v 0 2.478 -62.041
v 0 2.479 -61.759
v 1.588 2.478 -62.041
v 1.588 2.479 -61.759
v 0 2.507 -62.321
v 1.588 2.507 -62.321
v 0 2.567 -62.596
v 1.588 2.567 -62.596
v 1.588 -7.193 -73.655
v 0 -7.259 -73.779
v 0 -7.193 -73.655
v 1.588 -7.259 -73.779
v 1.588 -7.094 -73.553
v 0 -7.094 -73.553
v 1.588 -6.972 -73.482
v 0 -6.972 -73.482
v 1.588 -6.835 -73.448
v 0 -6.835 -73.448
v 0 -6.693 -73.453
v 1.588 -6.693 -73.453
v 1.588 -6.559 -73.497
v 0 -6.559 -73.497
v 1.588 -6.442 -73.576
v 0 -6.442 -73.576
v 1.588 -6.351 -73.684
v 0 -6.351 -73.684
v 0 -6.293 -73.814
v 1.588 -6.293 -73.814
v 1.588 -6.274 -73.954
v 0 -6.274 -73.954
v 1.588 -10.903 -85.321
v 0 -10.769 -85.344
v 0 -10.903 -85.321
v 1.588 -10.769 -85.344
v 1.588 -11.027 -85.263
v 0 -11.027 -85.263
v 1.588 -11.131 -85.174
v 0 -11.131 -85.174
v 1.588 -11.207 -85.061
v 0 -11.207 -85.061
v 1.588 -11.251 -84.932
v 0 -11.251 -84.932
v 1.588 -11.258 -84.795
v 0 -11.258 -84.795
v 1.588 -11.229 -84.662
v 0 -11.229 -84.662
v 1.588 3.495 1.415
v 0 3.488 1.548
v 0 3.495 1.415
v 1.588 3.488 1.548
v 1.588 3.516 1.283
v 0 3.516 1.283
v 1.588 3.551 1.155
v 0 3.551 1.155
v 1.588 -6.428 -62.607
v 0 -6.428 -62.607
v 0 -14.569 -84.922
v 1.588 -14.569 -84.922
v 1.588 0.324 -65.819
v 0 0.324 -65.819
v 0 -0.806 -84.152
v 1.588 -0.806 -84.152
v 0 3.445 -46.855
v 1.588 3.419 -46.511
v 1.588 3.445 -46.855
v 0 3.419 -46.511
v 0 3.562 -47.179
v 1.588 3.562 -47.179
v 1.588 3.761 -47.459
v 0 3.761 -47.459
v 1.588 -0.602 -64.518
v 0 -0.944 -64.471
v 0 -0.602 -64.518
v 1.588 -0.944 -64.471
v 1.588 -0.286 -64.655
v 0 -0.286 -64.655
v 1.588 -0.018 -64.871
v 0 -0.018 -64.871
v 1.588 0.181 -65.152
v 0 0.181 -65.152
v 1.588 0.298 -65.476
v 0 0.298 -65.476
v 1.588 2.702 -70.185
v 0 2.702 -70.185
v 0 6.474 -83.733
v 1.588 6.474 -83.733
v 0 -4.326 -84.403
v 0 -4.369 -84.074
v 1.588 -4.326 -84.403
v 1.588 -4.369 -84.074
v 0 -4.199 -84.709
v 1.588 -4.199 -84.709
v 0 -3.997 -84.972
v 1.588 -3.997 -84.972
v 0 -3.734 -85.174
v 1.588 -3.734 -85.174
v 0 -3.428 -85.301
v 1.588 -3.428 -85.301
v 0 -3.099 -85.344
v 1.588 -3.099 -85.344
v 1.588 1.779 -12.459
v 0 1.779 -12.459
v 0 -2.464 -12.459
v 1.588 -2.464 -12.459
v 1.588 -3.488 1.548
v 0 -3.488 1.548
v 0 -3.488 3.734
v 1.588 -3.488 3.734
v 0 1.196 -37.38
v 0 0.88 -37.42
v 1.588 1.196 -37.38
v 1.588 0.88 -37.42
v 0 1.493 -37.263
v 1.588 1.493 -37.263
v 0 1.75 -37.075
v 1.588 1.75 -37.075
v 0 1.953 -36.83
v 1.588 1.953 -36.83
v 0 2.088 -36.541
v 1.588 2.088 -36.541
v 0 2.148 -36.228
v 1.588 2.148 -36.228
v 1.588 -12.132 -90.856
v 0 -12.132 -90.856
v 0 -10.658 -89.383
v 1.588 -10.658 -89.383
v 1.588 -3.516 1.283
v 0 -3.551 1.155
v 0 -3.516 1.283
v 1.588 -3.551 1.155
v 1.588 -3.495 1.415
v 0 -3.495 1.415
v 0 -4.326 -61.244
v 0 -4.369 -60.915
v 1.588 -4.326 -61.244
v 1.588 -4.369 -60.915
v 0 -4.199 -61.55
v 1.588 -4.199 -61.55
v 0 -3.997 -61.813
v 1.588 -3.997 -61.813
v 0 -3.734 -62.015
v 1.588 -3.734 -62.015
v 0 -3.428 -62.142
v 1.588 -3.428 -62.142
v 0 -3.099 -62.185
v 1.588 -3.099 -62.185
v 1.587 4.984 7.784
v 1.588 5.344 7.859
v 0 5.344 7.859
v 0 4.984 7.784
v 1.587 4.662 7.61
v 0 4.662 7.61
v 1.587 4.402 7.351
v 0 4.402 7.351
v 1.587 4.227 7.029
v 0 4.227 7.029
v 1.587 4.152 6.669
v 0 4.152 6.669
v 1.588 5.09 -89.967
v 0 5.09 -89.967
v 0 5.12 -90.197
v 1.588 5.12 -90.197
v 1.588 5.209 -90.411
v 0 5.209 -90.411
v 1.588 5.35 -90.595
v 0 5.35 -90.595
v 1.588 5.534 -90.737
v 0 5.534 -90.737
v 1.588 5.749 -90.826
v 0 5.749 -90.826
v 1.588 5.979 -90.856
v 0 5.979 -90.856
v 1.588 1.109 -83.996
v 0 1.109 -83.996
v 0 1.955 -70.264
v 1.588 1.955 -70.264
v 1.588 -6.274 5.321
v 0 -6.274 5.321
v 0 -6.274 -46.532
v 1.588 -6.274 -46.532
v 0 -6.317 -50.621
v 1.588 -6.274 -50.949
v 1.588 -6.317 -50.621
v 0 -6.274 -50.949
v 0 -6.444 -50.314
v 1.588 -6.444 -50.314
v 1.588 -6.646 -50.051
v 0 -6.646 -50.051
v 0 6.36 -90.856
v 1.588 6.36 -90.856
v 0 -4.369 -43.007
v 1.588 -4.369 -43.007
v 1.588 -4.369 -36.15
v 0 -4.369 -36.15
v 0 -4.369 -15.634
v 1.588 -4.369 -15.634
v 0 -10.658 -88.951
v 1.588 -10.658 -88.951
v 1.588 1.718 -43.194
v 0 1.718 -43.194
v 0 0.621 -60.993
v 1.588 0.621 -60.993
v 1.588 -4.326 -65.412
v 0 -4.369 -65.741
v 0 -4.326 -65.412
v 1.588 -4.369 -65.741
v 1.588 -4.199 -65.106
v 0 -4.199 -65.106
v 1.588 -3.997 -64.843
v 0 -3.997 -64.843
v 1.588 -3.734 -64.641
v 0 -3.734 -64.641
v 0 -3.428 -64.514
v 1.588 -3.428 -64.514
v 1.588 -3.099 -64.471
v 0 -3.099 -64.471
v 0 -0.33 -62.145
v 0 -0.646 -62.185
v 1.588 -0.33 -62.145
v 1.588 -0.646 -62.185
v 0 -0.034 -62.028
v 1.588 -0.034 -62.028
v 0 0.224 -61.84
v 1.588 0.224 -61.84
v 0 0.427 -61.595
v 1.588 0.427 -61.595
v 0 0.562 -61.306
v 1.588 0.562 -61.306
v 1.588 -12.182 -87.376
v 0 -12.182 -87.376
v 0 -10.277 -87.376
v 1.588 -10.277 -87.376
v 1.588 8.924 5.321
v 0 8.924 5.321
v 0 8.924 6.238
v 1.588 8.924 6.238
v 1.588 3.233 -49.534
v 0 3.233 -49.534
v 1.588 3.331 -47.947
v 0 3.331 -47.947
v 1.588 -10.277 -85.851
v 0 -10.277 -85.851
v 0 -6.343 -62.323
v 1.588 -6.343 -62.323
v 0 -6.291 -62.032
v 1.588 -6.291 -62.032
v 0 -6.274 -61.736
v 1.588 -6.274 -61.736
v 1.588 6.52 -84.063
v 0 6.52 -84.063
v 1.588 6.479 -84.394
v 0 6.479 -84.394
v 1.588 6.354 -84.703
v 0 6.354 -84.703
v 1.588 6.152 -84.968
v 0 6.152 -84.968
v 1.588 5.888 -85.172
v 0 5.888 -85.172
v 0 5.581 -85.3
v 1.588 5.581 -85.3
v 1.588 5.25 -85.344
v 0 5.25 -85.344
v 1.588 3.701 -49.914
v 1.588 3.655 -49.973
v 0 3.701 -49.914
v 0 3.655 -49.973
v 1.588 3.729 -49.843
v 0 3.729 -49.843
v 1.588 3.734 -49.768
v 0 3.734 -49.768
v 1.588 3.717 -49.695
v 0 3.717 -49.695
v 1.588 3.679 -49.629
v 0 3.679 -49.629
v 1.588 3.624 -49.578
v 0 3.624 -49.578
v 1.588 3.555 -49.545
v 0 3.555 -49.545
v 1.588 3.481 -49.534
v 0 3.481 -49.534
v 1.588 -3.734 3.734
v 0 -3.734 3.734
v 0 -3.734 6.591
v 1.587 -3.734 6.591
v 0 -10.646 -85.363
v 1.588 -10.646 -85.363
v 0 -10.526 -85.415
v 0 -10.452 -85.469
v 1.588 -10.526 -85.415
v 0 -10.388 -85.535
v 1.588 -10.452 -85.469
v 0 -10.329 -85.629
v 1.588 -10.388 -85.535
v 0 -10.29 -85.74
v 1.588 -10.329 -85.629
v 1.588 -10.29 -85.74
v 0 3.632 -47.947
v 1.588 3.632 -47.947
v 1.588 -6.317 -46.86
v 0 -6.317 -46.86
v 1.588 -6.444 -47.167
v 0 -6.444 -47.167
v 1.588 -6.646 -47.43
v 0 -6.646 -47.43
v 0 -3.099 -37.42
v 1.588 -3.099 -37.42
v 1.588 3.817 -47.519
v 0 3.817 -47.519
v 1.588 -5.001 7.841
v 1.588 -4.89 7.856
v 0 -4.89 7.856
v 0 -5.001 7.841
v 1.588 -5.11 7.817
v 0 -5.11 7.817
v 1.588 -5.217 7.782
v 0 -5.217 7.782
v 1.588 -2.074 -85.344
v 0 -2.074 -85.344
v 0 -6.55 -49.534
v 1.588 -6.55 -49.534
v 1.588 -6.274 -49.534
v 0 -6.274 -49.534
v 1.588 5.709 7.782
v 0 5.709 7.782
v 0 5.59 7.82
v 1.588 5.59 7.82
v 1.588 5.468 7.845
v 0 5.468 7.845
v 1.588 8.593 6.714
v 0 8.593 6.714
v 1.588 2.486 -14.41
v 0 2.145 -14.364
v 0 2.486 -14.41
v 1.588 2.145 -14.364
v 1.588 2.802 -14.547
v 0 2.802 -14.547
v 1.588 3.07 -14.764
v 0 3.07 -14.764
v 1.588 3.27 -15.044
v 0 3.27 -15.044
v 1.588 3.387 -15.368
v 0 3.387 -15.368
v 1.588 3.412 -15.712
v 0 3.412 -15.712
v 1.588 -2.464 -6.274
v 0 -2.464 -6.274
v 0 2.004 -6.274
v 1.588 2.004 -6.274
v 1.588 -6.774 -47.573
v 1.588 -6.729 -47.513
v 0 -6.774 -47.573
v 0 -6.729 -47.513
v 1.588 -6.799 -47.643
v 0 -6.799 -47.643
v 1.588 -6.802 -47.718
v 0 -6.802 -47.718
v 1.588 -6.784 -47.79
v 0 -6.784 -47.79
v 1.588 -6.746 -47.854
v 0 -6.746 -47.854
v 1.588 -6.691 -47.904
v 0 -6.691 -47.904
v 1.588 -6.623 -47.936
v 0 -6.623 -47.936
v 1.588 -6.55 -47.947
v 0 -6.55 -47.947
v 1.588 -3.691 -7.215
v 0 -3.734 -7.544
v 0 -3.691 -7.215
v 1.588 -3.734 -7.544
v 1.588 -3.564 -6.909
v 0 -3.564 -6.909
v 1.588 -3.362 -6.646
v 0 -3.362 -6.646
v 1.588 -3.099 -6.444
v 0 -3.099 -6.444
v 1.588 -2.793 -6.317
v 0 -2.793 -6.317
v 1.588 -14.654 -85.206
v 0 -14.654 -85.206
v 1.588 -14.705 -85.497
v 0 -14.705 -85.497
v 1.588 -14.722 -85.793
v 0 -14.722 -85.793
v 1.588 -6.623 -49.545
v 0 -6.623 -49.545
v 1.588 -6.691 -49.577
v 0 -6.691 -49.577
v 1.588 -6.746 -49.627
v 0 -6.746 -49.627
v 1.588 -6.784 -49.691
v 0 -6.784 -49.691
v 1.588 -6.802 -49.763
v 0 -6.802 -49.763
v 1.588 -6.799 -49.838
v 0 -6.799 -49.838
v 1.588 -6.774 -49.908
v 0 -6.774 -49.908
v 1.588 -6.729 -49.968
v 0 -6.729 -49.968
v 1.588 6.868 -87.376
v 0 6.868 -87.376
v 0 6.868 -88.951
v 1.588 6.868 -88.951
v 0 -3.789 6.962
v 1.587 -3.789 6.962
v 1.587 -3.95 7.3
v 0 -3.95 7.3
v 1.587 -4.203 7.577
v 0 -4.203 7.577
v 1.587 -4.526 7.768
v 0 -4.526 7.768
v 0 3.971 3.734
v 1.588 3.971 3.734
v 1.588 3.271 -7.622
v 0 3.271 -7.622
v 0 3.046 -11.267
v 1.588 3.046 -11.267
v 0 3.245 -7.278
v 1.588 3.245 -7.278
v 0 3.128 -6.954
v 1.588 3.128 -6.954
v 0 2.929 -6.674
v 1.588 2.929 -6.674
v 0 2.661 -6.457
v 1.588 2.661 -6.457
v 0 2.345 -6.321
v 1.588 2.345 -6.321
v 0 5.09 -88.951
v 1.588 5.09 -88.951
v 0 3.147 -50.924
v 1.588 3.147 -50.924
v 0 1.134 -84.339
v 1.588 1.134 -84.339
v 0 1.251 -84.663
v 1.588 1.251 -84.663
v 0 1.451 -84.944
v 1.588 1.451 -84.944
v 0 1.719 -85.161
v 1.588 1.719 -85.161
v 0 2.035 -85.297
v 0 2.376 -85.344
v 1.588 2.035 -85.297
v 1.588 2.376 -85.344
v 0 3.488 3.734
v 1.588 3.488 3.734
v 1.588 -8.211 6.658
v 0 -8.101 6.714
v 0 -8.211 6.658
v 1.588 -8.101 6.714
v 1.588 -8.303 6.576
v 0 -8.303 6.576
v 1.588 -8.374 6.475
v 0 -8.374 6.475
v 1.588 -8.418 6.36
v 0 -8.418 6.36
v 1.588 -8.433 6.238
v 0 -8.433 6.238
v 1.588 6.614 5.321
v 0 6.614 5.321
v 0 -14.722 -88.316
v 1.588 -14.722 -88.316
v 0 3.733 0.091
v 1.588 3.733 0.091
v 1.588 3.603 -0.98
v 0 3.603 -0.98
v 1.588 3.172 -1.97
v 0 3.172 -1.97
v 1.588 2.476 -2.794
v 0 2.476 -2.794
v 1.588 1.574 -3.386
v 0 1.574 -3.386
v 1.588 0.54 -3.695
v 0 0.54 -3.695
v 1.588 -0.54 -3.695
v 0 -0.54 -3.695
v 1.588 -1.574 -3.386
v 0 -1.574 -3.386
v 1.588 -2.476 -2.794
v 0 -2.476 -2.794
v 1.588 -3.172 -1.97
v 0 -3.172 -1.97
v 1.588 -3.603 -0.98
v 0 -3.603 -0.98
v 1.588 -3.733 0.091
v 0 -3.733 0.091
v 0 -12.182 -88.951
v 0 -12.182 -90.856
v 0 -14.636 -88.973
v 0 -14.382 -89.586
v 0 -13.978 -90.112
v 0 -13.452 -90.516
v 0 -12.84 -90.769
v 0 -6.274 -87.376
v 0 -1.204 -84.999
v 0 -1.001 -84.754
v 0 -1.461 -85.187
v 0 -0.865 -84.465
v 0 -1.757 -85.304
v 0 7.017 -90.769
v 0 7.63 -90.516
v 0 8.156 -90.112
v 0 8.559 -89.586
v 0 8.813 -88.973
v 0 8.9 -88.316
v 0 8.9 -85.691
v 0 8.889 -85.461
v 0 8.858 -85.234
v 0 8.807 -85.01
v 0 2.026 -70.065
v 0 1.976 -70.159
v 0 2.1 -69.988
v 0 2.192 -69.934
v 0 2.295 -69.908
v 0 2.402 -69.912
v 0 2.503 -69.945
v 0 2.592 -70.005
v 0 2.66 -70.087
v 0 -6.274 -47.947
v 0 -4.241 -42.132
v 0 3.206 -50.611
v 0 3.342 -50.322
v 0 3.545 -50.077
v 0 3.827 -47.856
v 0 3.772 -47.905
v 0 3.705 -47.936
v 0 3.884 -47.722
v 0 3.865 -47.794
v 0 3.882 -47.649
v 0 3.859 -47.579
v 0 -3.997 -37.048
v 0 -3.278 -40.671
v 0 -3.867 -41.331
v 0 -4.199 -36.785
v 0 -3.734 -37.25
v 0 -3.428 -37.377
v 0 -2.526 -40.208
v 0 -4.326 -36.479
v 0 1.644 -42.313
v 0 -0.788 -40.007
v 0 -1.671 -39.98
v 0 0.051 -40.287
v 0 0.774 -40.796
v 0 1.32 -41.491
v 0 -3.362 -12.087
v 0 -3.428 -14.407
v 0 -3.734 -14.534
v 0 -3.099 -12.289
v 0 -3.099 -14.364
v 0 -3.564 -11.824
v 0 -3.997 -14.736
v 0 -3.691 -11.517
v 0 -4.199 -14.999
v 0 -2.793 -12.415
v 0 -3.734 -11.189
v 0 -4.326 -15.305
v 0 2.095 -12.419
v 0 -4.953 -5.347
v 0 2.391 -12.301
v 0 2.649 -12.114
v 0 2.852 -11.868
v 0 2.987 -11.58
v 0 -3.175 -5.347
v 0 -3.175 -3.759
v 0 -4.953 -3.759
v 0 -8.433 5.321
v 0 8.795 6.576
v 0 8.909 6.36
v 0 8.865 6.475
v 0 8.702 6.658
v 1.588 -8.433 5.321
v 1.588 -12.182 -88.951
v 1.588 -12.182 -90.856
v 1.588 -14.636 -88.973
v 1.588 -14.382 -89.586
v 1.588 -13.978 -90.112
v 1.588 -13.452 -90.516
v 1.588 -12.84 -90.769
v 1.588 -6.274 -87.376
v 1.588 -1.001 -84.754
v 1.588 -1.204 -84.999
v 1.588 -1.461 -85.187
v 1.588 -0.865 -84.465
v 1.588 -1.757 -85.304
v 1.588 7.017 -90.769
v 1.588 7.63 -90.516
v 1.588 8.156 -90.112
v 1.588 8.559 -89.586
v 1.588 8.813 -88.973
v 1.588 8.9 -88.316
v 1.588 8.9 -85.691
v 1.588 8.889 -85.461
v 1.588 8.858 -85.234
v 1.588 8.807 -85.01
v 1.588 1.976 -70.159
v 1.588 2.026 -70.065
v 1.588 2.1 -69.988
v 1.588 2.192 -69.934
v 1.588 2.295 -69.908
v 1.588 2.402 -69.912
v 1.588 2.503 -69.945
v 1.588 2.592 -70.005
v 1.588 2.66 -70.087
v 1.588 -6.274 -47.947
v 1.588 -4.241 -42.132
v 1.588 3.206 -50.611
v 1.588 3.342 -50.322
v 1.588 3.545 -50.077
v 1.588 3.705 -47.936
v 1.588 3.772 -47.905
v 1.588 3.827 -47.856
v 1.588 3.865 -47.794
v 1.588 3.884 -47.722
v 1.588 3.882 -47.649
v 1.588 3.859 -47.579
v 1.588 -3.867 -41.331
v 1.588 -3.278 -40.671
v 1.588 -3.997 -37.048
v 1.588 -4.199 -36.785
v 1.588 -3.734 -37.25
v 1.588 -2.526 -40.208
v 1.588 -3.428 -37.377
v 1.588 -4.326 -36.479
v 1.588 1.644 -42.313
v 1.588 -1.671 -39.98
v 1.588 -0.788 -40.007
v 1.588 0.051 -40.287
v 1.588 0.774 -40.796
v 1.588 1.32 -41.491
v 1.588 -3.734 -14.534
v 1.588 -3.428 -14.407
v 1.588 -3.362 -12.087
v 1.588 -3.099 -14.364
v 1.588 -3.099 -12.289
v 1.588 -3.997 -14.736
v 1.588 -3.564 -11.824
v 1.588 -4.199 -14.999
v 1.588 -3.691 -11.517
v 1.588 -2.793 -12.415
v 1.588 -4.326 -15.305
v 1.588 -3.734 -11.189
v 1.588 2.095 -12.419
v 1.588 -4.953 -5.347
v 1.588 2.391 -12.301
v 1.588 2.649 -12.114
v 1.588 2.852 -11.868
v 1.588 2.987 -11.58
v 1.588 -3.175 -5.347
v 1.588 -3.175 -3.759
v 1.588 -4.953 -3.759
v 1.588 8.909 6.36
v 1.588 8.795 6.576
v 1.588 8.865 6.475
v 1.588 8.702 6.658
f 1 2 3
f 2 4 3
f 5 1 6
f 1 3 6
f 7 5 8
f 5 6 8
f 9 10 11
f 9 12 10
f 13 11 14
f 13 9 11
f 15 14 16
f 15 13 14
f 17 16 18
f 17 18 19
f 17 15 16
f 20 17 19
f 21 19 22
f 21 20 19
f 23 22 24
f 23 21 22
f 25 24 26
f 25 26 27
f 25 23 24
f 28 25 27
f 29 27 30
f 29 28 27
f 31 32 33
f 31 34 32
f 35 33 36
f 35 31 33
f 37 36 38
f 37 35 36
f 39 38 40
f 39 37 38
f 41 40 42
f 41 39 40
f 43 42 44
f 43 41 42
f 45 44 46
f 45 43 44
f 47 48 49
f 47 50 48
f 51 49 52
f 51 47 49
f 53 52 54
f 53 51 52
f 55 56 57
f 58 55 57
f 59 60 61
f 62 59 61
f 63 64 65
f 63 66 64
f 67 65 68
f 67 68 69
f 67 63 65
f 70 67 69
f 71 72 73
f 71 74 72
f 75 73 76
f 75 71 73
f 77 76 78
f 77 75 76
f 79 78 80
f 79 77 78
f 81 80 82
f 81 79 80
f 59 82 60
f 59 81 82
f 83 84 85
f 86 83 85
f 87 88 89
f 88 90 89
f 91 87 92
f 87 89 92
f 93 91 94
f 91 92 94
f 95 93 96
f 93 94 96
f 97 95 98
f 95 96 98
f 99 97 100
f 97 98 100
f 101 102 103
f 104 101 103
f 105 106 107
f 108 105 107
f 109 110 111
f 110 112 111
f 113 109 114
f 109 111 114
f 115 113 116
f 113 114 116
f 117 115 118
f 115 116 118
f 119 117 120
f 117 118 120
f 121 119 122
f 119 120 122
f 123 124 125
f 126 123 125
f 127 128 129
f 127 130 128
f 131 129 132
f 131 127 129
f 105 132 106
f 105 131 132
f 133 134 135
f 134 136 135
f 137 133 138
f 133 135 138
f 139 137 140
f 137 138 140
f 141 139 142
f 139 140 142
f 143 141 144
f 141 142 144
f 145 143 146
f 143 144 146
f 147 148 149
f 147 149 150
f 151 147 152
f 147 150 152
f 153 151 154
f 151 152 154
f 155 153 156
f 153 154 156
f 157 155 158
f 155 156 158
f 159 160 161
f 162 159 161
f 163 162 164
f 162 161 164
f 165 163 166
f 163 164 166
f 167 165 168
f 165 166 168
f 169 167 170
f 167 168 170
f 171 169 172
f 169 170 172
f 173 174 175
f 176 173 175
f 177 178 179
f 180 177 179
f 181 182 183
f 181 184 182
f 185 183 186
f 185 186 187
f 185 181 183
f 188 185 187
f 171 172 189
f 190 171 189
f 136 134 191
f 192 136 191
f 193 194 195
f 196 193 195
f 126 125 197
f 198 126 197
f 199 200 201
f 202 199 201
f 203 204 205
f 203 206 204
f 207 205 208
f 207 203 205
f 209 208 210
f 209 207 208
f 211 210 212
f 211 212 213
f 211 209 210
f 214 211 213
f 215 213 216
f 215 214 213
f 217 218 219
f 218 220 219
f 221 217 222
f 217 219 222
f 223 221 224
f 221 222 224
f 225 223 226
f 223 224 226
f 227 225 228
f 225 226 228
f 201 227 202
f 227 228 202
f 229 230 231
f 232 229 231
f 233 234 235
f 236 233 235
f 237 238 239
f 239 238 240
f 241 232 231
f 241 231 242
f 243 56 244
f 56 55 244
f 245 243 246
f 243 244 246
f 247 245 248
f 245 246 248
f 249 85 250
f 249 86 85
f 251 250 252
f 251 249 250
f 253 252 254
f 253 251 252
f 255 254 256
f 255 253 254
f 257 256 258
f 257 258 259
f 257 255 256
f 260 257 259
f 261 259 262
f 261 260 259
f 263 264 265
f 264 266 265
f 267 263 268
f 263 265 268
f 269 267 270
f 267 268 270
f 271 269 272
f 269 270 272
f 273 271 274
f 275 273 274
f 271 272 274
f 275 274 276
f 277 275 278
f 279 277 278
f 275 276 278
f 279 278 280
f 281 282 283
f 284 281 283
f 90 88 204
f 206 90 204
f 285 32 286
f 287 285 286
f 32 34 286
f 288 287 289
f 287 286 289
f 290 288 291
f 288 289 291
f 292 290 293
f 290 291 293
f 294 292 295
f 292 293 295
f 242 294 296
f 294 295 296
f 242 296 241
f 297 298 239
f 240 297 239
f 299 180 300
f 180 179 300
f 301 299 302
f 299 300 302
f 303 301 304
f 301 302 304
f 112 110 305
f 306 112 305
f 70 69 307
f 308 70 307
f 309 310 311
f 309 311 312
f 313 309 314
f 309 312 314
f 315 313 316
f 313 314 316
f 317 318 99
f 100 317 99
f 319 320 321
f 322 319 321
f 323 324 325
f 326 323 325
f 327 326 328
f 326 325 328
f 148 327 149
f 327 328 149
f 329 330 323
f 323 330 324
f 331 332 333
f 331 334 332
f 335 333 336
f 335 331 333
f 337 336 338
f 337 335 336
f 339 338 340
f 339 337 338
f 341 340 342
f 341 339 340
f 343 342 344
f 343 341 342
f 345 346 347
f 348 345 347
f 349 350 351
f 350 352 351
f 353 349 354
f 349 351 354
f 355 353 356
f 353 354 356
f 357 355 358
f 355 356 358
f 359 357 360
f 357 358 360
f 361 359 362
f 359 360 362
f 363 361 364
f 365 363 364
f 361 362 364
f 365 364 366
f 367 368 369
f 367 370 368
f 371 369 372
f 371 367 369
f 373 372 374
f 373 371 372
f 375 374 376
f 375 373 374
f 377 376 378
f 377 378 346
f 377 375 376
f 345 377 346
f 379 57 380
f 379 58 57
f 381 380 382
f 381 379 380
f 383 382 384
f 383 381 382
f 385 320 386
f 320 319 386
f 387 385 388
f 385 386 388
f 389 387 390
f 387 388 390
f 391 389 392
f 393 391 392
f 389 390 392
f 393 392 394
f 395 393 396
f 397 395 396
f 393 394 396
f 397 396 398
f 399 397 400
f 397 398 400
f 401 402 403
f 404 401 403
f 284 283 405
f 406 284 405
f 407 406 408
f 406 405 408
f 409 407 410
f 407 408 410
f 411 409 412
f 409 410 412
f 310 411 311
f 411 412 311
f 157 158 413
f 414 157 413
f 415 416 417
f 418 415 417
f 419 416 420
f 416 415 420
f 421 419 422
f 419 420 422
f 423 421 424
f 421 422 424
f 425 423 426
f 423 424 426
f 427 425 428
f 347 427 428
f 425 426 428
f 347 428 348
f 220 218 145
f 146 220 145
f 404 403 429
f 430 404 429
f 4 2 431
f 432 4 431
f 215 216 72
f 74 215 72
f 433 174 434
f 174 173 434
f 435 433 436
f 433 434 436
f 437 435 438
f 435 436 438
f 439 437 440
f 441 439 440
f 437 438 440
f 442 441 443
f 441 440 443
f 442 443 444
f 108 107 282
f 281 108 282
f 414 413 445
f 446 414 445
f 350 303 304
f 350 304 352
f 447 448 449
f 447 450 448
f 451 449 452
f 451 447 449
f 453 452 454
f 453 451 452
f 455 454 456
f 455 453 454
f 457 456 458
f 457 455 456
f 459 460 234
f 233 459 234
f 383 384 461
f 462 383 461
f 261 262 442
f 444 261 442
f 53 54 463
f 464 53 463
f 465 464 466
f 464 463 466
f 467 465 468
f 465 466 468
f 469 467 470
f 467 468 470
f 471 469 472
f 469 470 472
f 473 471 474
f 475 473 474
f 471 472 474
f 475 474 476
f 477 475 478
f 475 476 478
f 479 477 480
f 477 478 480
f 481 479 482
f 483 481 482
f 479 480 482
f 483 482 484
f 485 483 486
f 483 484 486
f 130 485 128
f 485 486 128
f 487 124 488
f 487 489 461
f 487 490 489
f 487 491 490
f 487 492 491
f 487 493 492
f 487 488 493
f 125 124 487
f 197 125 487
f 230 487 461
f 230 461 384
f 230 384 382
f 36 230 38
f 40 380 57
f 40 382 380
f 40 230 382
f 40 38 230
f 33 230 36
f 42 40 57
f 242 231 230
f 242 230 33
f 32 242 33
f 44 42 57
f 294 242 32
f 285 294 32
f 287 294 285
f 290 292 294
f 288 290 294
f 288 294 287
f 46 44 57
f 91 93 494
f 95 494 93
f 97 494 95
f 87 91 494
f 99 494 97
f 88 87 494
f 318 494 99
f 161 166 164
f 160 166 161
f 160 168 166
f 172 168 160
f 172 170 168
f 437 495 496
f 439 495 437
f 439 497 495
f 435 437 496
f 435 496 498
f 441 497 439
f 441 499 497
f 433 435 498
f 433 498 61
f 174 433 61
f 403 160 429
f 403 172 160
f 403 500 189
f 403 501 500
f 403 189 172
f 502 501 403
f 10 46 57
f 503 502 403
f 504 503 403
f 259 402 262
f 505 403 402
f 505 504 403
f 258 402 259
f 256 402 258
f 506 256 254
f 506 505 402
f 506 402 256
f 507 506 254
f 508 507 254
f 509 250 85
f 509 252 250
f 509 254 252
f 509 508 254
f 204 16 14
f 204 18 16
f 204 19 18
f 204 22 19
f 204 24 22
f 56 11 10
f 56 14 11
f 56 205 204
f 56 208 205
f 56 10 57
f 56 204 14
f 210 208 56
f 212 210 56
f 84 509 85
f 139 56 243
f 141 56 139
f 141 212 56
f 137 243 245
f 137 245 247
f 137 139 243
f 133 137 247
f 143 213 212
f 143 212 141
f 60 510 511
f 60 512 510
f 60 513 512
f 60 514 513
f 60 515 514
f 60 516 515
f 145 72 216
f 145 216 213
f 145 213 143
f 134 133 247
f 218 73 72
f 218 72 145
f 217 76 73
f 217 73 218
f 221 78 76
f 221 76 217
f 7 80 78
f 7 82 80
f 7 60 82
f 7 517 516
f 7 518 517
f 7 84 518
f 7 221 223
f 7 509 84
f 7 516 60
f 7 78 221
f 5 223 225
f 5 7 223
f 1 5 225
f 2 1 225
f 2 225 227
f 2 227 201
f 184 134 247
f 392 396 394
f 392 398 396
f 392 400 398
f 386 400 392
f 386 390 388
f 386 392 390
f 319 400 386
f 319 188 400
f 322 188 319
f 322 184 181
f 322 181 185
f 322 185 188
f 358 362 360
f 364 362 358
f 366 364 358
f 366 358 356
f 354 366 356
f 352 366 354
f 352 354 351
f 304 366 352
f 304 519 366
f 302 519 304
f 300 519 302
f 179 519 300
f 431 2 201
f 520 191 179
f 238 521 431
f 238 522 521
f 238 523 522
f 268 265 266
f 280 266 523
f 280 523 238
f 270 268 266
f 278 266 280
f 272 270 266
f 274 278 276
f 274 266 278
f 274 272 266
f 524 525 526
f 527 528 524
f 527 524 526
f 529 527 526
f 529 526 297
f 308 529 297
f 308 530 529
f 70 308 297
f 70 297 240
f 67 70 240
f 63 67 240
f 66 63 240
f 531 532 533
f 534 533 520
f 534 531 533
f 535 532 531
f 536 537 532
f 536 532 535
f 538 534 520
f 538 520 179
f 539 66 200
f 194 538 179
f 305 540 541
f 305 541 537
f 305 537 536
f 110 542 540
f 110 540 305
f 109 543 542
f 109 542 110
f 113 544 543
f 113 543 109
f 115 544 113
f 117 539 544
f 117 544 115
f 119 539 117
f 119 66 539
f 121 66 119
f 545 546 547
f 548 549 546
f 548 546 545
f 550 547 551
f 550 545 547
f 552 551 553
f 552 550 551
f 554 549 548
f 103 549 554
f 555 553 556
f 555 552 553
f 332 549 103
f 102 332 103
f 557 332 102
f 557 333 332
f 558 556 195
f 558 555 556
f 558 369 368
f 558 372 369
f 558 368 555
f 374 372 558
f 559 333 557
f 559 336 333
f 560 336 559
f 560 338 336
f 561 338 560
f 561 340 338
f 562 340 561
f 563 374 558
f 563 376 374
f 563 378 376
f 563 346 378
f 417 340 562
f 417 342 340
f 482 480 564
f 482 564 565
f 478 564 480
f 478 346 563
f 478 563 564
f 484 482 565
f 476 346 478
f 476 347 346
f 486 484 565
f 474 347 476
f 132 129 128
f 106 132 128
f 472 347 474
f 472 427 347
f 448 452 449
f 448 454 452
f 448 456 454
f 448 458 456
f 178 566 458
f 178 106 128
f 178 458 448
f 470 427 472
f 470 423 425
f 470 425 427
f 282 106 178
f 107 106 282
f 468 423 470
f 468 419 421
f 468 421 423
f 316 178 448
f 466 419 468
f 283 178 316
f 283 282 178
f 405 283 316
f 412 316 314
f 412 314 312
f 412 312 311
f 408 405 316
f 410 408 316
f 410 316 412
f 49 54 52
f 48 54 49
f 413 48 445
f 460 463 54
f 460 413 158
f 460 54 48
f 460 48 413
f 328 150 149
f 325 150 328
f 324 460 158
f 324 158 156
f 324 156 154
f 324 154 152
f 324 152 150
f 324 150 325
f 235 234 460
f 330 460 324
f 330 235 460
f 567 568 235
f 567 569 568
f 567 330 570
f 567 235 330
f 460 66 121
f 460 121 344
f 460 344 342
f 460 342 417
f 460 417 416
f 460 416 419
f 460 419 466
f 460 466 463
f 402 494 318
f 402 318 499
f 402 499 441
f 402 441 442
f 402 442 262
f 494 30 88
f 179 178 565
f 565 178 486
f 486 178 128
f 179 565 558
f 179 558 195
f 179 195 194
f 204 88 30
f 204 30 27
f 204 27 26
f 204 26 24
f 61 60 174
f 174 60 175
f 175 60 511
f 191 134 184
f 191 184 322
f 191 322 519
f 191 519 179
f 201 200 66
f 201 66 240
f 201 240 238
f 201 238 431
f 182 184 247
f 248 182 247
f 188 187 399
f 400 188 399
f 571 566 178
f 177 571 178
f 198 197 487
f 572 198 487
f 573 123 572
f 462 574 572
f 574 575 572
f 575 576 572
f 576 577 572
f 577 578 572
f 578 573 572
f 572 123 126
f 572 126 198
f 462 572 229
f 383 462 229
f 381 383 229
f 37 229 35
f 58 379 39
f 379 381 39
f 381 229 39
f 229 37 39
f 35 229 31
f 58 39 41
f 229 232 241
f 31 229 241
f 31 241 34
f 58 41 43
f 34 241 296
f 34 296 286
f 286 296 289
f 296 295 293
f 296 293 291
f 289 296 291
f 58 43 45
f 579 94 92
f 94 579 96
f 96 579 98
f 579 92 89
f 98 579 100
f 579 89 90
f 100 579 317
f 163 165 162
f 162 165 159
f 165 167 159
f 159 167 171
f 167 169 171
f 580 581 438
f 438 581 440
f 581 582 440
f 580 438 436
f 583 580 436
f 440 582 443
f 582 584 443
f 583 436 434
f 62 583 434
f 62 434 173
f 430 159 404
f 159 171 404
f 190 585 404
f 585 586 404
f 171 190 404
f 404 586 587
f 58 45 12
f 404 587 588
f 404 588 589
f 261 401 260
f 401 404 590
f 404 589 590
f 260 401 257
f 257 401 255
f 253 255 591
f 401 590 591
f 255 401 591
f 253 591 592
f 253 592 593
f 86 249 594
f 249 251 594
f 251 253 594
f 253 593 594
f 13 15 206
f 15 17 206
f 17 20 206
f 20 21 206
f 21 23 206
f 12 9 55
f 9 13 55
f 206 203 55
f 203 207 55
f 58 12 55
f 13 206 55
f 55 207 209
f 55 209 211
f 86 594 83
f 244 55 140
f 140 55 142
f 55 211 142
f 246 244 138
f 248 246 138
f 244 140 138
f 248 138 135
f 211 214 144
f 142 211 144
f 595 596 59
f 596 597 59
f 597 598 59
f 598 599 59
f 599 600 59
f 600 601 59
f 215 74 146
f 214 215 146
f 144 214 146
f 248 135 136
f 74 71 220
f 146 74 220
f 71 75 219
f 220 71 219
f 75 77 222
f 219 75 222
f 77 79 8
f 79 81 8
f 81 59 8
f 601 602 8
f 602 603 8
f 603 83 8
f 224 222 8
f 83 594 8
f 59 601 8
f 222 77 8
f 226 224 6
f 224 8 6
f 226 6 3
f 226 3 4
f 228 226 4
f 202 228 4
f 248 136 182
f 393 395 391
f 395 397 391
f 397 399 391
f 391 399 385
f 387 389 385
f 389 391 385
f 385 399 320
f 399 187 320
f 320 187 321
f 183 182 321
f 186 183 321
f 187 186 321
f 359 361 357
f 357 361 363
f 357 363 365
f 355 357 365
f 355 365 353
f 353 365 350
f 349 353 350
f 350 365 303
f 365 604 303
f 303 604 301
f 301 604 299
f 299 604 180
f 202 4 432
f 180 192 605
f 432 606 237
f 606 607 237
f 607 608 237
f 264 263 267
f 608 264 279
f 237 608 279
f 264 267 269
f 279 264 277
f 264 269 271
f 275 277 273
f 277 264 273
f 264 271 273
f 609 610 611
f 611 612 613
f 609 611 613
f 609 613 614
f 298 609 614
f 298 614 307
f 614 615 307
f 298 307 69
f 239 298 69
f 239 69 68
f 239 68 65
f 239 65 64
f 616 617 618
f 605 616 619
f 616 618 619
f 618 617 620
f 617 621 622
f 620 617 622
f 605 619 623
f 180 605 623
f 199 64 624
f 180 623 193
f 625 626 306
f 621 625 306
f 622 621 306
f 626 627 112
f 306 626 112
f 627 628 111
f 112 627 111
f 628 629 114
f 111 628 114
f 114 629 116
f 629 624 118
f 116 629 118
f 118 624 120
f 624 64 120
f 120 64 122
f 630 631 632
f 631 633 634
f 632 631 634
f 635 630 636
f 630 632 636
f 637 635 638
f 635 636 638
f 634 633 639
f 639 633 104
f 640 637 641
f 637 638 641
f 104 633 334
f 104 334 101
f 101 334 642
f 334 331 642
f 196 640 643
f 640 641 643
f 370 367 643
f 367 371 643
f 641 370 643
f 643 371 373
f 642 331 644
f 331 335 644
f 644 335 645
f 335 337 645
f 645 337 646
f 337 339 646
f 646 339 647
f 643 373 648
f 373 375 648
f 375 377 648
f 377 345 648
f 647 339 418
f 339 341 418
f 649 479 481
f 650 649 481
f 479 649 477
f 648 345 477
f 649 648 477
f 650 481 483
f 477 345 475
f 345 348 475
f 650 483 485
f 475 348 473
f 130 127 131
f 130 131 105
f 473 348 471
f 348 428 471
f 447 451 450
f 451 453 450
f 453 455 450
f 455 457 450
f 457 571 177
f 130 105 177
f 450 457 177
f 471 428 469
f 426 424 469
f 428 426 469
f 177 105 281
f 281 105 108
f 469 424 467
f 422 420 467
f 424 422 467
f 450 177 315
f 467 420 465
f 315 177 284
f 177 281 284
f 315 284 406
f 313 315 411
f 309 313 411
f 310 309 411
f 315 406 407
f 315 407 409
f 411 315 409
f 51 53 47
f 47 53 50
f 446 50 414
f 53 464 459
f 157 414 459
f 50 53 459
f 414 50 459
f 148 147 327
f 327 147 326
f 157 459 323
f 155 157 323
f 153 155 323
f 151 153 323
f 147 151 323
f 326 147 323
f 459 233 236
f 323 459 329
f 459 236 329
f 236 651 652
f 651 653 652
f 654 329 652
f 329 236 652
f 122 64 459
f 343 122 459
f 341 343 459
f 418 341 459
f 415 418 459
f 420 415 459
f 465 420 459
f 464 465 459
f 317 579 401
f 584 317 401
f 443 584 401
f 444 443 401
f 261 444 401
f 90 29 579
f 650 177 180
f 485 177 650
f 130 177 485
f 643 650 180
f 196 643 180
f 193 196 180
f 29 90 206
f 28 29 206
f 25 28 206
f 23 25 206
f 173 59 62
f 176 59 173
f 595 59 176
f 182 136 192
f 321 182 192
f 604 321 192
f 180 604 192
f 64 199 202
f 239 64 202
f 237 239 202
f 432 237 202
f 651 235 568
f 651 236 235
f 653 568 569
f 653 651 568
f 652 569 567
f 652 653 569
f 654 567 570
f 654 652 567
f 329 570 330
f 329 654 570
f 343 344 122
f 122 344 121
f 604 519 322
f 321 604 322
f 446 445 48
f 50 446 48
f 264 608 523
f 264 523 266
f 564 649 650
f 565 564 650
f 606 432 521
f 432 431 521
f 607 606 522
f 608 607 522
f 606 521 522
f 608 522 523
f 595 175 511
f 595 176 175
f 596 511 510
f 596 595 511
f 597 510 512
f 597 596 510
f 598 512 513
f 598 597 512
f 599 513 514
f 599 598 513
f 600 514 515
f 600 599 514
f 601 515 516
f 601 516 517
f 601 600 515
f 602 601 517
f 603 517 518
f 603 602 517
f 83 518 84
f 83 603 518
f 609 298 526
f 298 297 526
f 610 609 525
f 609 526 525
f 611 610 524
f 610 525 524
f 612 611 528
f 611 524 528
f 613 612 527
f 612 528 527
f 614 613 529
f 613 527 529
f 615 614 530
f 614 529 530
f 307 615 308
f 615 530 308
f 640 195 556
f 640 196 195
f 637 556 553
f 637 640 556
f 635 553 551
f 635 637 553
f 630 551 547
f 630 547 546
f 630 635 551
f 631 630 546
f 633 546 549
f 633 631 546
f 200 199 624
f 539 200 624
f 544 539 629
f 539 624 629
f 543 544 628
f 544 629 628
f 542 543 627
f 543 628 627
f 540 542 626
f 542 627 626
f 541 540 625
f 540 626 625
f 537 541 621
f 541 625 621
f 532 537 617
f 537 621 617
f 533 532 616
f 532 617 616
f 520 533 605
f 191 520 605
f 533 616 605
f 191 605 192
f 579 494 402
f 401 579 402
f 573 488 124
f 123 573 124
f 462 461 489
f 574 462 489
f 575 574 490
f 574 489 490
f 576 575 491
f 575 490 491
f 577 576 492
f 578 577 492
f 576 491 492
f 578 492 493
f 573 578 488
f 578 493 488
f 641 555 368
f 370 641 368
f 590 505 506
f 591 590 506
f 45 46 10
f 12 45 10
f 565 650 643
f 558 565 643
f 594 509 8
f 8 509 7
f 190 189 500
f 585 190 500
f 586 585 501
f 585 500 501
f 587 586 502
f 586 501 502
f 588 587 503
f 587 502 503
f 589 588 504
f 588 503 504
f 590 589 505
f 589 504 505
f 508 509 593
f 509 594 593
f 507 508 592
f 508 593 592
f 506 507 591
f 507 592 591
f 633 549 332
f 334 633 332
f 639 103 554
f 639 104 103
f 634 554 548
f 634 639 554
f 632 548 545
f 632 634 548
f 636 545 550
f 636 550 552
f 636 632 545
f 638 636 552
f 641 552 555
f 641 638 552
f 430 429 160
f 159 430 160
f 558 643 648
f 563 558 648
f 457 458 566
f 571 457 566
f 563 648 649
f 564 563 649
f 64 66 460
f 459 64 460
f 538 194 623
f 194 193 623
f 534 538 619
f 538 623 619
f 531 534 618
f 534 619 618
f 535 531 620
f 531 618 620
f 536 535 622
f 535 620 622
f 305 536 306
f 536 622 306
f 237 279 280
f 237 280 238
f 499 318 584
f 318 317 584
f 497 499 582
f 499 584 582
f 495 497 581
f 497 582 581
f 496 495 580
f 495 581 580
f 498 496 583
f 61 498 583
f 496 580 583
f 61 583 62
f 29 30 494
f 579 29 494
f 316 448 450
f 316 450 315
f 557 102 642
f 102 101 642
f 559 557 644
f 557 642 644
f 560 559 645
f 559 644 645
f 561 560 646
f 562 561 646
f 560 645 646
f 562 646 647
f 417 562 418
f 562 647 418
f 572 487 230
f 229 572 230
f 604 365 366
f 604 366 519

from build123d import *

# Parameters (mm, degrees)
BOSS_EXTRUDE1_DEPTH = 1.5875
CUT_EXTRUDE2_DEPTH  = 93.054574745
FILLET1_R           = 2.54
FILLET2_R           = 1.27
FILLET3_R           = 0.508
FILLET4_R           = 0.508
BOSS_EXTRUDE3_DEPTH = 1.5875
FILLET5_R           = 1.27
FILLET6_R           = 0.254
BOSS_EXTRUDE4_DEPTH = 1.5875
CUT_EXTRUDE1_REACH  = 94.055
FILLET9_R           = 1.27
FILLET10_R          = 0.381
FILLET12_R          = 1.27
FILLET13_R          = 0.508


with BuildPart() as part:
    # Sketch1 → Boss-Extrude1 (new body)
    with BuildSketch(Plane(origin=(0, 0, 0), x_dir=(0, 0, -1), z_dir=(1, 0, 0))):
        with BuildLine():
            Line((62.185099246, -6.2738), (85.344, -14.722370106))
            Line((85.344, -14.722370106), (88.3158, -14.722370106))
            ThreePointArc((88.3158, -14.722370106), (90.111851224, -13.978421331), (90.8558, -12.182370106))
            Line((90.8558, -12.182370106), (90.8558, -12.131570106))
            Line((90.8558, -12.131570106), (89.3826, -10.658370106))
            Line((89.3826, -10.658370106), (88.9508, -10.658370106))
            Line((88.9508, -10.658370106), (88.9508, -12.182370106))
            Line((88.9508, -12.182370106), (87.376, -12.182370106))
            Line((87.376, -12.182370106), (87.376, -10.277370106))
            Line((87.376, -10.277370106), (85.344, -10.277370106))
            Line((85.344, -10.277370106), (85.344, -11.477881212))
            Line((85.344, -11.477881212), (71.07876946, -6.2738))
            Line((71.07876946, -6.2738), (87.376, -6.2738))
            Line((87.376, -6.2738), (87.376, 6.867629894))
            Line((87.376, 6.867629894), (88.9508, 6.867629894))
            Line((88.9508, 6.867629894), (88.9508, 5.089629894))
            Line((88.9508, 5.089629894), (89.9668, 5.089629894))
            ThreePointArc((89.9668, 5.089629894), (90.595417928, 5.350011965), (90.8558, 5.978629894))
            Line((90.8558, 5.978629894), (90.8558, 6.359629894))
            ThreePointArc((90.8558, 6.359629894), (90.111851224, 8.155681118), (88.3158, 8.899629894))
            Line((88.3158, 8.899629894), (85.344, 8.899629894))
            Line((85.344, 8.899629894), (62.185099246, 2.453000952))
            Line((62.185099246, 2.453000952), (-5.3213, 6.613676867))
            Line((-5.3213, 6.613676867), (-5.3213, 8.924406911))
            Line((-5.3213, 8.924406911), (-7.8613, 8.924406911))
            Line((-7.8613, 8.924406911), (-7.8613, 4.225406911))
            Line((-7.8613, 4.225406911), (-3.7338, 3.971013401))
            Line((-3.7338, 3.971013401), (-3.7338, 3.488413401))
            Line((-3.7338, 3.488413401), (-1.331252938, 3.488413401))
            ThreePointArc((-1.331252938, 3.488413401), (3.7338, 0), (-1.331252938, -3.488413401))
            Line((-1.331252938, -3.488413401), (-3.7338, -3.488413401))
            Line((-3.7338, -3.488413401), (-3.7338, -3.7338))
            Line((-3.7338, -3.7338), (-5.3213, -3.7338))
            Line((-5.3213, -3.7338), (-7.8613, -3.7338))
            Line((-7.8613, -3.7338), (-7.8613, -8.4328))
            Line((-7.8613, -8.4328), (-5.3213, -8.4328))
            Line((-5.3213, -8.4328), (-5.3213, -6.2738))
            Line((-5.3213, -6.2738), (62.185099246, -6.2738))
        make_face()
        Polygon((12.4587, -3.7338), (6.2738, -3.7338), (6.2738, 3.354206983), (12.4587, 2.973008093), align=None, mode=Mode.SUBTRACT)
        Polygon((14.3637, -4.3688), (14.3637, 3.495415512), (37.420099246, 2.074362011), (37.420099246, -4.3688), align=None, mode=Mode.SUBTRACT)
        Polygon((64.471099246, -4.3688), (64.471099246, 0.407106085), (85.344, -0.879370106), (85.344, -4.3688), align=None, mode=Mode.SUBTRACT)
        Polygon((39.325099246, -4.3688), (39.325099246, 1.956949622), (62.185099246, 0.548000952), (62.185099246, -4.3688), align=None, mode=Mode.SUBTRACT)
        Polygon((85.344, 6.922200335), (85.344, 1.025629894), (68.00108793, 2.094539469), align=None, mode=Mode.SUBTRACT)
    extrude(amount=BOSS_EXTRUDE1_DEPTH)

    # Sketch7 → Cut-Extrude2 (cut, through all)
    with BuildSketch(Plane.ZY):
        Polygon((6.5913, 8.924406911), (7.8613, 5.495406911), (7.8613, 8.924406911), align=None)
        Polygon((6.5913, -8.4328), (7.8613, -5.0038), (7.8613, -8.4328), align=None)
    extrude(amount=-CUT_EXTRUDE2_DEPTH, mode=Mode.SUBTRACT)

    # Fillet1
    fillet1_edges = [part.edges().sort_by_distance(p)[0] for p in [
        (0.79375, 2.453000952, -62.185099246),
        (0.79375, 8.899629894, -85.344),
        (0.79375, -14.722370106, -85.344),
        (0.79375, -6.2738, -62.185099246),
    ]]
    fillet(fillet1_edges, radius=FILLET1_R)

    # Fillet2
    fillet2_edges = [part.edges().sort_by_distance(p)[0] for p in [
        (0.79375, -4.3688, -85.344),
        (0.79375, -0.879370106, -85.344),
        (0.79375, 0.407106085, -64.471099246),
        (0.79375, -4.3688, -64.471099246),
        (0.79375, 1.025629894, -85.344),
        (0.79375, 6.922200335, -85.344),
        (0.79375, -4.3688, -37.420099246),
        (0.79375, 2.074362011, -37.420099246),
        (0.79375, 3.495415512, -14.3637),
        (0.79375, -4.3688, -14.3637),
        (0.79375, -4.3688, -62.185099246),
        (0.79375, 0.548000952, -62.185099246),
        (0.79375, -3.7338, -12.4587),
        (0.79375, 2.973008093, -12.4587),
        (0.79375, 3.354206983, -6.2738),
        (0.79375, -3.7338, -6.2738),
    ]]
    fillet(fillet2_edges, radius=FILLET2_R)

    # Fillet3
    fillet3_edges = [part.edges().sort_by_distance(p)[0] for p in [
        (0.79375, -6.2738, -71.07876946),
        (0.79375, -11.477881212, -85.344),
    ]]
    fillet(fillet3_edges, radius=FILLET3_R)

    # Fillet4
    fillet4_edges = [part.edges().sort_by_distance(p)[0] for p in [
        (0.79375, -10.277370106, -85.344),
    ]]
    fillet(fillet4_edges, radius=FILLET4_R)

    # Sketch6 → Boss-Extrude3 (add)
    with BuildSketch(Plane.ZY.offset(-1.5875)):
        Polygon((-47.9467, -6.2738), (-47.0577, -6.2738), (-47.9467, -7.1628), align=None)
        Polygon((-49.5342, -6.2738), (-50.4232, -6.2738), (-49.5342, -7.1628), align=None)
        Polygon((-49.5342, 3.232723947), (-50.421516262, 3.178035274), (-49.5342, 4.121723947), align=None)
        Polygon((-47.059383738, 3.385256278), (-47.9467, 4.219567605), (-47.9467, 3.330567605), align=None)
        Polygon((-47.9467, 4.219567605), (-47.9467, 3.330567605), (-47.059383738, 3.385256278), align=None)
        Polygon((-49.5342, 4.121723947), (-49.5342, 3.232723947), (-50.421516262, 3.178035274), align=None)
        Polygon((-50.4232, -6.2738), (-49.5342, -7.1628), (-49.5342, -6.2738), align=None)
        Polygon((-47.9467, -7.1628), (-47.9467, -6.2738), (-47.0577, -6.2738), align=None)
    extrude(amount=BOSS_EXTRUDE3_DEPTH)

    # Fillet5
    fillet5_edges = [part.edges().sort_by_distance(p)[0] for p in [
        (0.79375, 3.385256278, -47.059383738),
        (0.79375, 3.178035274, -50.421516262),
        (0.79375, -6.2738, -50.4232),
        (0.79375, -6.2738, -47.0577),
    ]]
    fillet(fillet5_edges, radius=FILLET5_R)

    # Fillet6
    fillet6_edges = [part.edges().sort_by_distance(p)[0] for p in [
        (0.79375, 4.219567605, -47.9467),
        (0.79375, 4.121723947, -49.5342),
        (0.79375, -7.1628, -49.5342),
        (0.79375, -7.1628, -47.9467),
    ]]
    fillet(fillet6_edges, radius=FILLET6_R)

    # Sketch4 → Boss-Extrude4 (add)
    with BuildSketch(Plane(origin=(1.5875, 0, 0), x_dir=(0, 0, -1), z_dir=(1, 0, 0))):
        with BuildLine():
            Line((39.325099246, 1.956949622), (43.194043845, 1.718491864))
            ThreePointArc((43.194043845, 1.718491864), (39.961542096, -1.228517825), (43.006630195, -4.3688))
            Line((43.006630195, -4.3688), (39.325099246, -4.3688))
            Line((39.325099246, -4.3688), (39.325099246, 1.956949622))
        make_face()
    extrude(amount=-BOSS_EXTRUDE4_DEPTH)

    # Sketch5 → Cut-Extrude1 (cut, up to next)
    with BuildSketch(Plane(origin=(1.5875, 0, 0), x_dir=(0, 0, -1), z_dir=(1, 0, 0)), mode=Mode.PRIVATE) as cut_extrude1_sk1:
        Polygon((3.7592, -4.445), (3.7592, -4.953), (5.3467, -4.953), (5.3467, -4.445), (5.3467, -3.683), (5.3467, -3.175), (3.7592, -3.175), (3.7592, -3.683), align=None)
    cut_extrude1_tool1 = extrude(cut_extrude1_sk1.sketch, amount=-CUT_EXTRUDE1_REACH, mode=Mode.PRIVATE) & part.part
    add(cut_extrude1_tool1.solids().sort_by_distance((1.5875, -4.064, -4.55295))[0], mode=Mode.SUBTRACT)

    # Fillet9
    fillet9_edges = [part.edges().sort_by_distance(p)[0] for p in [
        (0.79375, 3.488413401, 1.331252938),
        (0.79375, -3.488413401, 1.331252938),
    ]]
    fillet(fillet9_edges, radius=FILLET9_R)

    # Fillet10
    fillet10_edges = [part.edges().sort_by_distance(p)[0] for p in [
        (0.79375, 2.094539469, -68.00108793),
    ]]
    fillet(fillet10_edges, radius=FILLET10_R)

    # Fillet12
    # the kernel refuses this fillet: 1.27 mm, written as the material it takes off along each edge
    with BuildSketch(Plane(origin=(-0.569074331, -5.0038, 7.8613), x_dir=(0, 1, 0), z_dir=(1, 0, 0))) as fillet12_piece_1:
        with BuildLine():
            CenterArc((FILLET12_R * 0.179236009778, -FILLET12_R), FILLET12_R, 90, 20.32313683)
            Line((-FILLET12_R * 0.168078346046, -FILLET12_R * 0.0622512392763), (0, 0))
            Line((0, 0), (FILLET12_R * 0.179236009778, 0))
        make_face()
    extrude(amount=2.725648662, mode=Mode.SUBTRACT)
    with BuildSketch(Plane(origin=(-3.175, -3.7338, 7.8613), x_dir=(0, 1.571796061637141e-12, -1.0), z_dir=(1, 0, 0))) as fillet12_piece_2:
        with BuildLine():
            CenterArc((FILLET12_R, -FILLET12_R), FILLET12_R, 90, 90)
            Line((0, -FILLET12_R), (0, 0))
            Line((0, 0), (FILLET12_R, 0))
        make_face()
    extrude(amount=7.9375, mode=Mode.SUBTRACT)
    with BuildSketch(Plane(origin=(-0.569074331, 5.495406911, 7.8613), x_dir=(0, -1, 0), z_dir=(1, 0, 0))) as fillet12_piece_3:
        with BuildLine():
            CenterArc((FILLET12_R * 0.179236009778, FILLET12_R), FILLET12_R, 249.67686317, 20.32313683)
            Line((-FILLET12_R * 0.168078346046, FILLET12_R * 0.0622512392763), (0, 0))
            Line((0, 0), (FILLET12_R * 0.179236009778, 0))
        make_face()
    extrude(amount=2.725648662, mode=Mode.SUBTRACT)
    with BuildSketch(Plane(origin=(-2.985337445, 4.225406911, 7.8613), x_dir=(0, -0.06151706759749907, -0.9981060316390262), z_dir=(1, 0, 0))) as fillet12_piece_4:
        with BuildLine():
            CenterArc((FILLET12_R * 0.940263762219, FILLET12_R), FILLET12_R, 183.526895232, 86.473104768)
            Line((-FILLET12_R * 0.0578422694199, FILLET12_R * 0.938482932403), (0, 0))
            Line((0, 0), (FILLET12_R * 0.940263762219, 0))
        make_face()
    extrude(amount=7.55817489, mode=Mode.SUBTRACT)

    # Fillet13
    fillet13_edges = [part.edges().sort_by_distance(p)[0] for p in [
        (0.79375, 8.924406911, 6.5913),
        (0.79375, -8.4328, 6.5913),
    ]]
    fillet(fillet13_edges, radius=FILLET13_R)


solid = part.part
